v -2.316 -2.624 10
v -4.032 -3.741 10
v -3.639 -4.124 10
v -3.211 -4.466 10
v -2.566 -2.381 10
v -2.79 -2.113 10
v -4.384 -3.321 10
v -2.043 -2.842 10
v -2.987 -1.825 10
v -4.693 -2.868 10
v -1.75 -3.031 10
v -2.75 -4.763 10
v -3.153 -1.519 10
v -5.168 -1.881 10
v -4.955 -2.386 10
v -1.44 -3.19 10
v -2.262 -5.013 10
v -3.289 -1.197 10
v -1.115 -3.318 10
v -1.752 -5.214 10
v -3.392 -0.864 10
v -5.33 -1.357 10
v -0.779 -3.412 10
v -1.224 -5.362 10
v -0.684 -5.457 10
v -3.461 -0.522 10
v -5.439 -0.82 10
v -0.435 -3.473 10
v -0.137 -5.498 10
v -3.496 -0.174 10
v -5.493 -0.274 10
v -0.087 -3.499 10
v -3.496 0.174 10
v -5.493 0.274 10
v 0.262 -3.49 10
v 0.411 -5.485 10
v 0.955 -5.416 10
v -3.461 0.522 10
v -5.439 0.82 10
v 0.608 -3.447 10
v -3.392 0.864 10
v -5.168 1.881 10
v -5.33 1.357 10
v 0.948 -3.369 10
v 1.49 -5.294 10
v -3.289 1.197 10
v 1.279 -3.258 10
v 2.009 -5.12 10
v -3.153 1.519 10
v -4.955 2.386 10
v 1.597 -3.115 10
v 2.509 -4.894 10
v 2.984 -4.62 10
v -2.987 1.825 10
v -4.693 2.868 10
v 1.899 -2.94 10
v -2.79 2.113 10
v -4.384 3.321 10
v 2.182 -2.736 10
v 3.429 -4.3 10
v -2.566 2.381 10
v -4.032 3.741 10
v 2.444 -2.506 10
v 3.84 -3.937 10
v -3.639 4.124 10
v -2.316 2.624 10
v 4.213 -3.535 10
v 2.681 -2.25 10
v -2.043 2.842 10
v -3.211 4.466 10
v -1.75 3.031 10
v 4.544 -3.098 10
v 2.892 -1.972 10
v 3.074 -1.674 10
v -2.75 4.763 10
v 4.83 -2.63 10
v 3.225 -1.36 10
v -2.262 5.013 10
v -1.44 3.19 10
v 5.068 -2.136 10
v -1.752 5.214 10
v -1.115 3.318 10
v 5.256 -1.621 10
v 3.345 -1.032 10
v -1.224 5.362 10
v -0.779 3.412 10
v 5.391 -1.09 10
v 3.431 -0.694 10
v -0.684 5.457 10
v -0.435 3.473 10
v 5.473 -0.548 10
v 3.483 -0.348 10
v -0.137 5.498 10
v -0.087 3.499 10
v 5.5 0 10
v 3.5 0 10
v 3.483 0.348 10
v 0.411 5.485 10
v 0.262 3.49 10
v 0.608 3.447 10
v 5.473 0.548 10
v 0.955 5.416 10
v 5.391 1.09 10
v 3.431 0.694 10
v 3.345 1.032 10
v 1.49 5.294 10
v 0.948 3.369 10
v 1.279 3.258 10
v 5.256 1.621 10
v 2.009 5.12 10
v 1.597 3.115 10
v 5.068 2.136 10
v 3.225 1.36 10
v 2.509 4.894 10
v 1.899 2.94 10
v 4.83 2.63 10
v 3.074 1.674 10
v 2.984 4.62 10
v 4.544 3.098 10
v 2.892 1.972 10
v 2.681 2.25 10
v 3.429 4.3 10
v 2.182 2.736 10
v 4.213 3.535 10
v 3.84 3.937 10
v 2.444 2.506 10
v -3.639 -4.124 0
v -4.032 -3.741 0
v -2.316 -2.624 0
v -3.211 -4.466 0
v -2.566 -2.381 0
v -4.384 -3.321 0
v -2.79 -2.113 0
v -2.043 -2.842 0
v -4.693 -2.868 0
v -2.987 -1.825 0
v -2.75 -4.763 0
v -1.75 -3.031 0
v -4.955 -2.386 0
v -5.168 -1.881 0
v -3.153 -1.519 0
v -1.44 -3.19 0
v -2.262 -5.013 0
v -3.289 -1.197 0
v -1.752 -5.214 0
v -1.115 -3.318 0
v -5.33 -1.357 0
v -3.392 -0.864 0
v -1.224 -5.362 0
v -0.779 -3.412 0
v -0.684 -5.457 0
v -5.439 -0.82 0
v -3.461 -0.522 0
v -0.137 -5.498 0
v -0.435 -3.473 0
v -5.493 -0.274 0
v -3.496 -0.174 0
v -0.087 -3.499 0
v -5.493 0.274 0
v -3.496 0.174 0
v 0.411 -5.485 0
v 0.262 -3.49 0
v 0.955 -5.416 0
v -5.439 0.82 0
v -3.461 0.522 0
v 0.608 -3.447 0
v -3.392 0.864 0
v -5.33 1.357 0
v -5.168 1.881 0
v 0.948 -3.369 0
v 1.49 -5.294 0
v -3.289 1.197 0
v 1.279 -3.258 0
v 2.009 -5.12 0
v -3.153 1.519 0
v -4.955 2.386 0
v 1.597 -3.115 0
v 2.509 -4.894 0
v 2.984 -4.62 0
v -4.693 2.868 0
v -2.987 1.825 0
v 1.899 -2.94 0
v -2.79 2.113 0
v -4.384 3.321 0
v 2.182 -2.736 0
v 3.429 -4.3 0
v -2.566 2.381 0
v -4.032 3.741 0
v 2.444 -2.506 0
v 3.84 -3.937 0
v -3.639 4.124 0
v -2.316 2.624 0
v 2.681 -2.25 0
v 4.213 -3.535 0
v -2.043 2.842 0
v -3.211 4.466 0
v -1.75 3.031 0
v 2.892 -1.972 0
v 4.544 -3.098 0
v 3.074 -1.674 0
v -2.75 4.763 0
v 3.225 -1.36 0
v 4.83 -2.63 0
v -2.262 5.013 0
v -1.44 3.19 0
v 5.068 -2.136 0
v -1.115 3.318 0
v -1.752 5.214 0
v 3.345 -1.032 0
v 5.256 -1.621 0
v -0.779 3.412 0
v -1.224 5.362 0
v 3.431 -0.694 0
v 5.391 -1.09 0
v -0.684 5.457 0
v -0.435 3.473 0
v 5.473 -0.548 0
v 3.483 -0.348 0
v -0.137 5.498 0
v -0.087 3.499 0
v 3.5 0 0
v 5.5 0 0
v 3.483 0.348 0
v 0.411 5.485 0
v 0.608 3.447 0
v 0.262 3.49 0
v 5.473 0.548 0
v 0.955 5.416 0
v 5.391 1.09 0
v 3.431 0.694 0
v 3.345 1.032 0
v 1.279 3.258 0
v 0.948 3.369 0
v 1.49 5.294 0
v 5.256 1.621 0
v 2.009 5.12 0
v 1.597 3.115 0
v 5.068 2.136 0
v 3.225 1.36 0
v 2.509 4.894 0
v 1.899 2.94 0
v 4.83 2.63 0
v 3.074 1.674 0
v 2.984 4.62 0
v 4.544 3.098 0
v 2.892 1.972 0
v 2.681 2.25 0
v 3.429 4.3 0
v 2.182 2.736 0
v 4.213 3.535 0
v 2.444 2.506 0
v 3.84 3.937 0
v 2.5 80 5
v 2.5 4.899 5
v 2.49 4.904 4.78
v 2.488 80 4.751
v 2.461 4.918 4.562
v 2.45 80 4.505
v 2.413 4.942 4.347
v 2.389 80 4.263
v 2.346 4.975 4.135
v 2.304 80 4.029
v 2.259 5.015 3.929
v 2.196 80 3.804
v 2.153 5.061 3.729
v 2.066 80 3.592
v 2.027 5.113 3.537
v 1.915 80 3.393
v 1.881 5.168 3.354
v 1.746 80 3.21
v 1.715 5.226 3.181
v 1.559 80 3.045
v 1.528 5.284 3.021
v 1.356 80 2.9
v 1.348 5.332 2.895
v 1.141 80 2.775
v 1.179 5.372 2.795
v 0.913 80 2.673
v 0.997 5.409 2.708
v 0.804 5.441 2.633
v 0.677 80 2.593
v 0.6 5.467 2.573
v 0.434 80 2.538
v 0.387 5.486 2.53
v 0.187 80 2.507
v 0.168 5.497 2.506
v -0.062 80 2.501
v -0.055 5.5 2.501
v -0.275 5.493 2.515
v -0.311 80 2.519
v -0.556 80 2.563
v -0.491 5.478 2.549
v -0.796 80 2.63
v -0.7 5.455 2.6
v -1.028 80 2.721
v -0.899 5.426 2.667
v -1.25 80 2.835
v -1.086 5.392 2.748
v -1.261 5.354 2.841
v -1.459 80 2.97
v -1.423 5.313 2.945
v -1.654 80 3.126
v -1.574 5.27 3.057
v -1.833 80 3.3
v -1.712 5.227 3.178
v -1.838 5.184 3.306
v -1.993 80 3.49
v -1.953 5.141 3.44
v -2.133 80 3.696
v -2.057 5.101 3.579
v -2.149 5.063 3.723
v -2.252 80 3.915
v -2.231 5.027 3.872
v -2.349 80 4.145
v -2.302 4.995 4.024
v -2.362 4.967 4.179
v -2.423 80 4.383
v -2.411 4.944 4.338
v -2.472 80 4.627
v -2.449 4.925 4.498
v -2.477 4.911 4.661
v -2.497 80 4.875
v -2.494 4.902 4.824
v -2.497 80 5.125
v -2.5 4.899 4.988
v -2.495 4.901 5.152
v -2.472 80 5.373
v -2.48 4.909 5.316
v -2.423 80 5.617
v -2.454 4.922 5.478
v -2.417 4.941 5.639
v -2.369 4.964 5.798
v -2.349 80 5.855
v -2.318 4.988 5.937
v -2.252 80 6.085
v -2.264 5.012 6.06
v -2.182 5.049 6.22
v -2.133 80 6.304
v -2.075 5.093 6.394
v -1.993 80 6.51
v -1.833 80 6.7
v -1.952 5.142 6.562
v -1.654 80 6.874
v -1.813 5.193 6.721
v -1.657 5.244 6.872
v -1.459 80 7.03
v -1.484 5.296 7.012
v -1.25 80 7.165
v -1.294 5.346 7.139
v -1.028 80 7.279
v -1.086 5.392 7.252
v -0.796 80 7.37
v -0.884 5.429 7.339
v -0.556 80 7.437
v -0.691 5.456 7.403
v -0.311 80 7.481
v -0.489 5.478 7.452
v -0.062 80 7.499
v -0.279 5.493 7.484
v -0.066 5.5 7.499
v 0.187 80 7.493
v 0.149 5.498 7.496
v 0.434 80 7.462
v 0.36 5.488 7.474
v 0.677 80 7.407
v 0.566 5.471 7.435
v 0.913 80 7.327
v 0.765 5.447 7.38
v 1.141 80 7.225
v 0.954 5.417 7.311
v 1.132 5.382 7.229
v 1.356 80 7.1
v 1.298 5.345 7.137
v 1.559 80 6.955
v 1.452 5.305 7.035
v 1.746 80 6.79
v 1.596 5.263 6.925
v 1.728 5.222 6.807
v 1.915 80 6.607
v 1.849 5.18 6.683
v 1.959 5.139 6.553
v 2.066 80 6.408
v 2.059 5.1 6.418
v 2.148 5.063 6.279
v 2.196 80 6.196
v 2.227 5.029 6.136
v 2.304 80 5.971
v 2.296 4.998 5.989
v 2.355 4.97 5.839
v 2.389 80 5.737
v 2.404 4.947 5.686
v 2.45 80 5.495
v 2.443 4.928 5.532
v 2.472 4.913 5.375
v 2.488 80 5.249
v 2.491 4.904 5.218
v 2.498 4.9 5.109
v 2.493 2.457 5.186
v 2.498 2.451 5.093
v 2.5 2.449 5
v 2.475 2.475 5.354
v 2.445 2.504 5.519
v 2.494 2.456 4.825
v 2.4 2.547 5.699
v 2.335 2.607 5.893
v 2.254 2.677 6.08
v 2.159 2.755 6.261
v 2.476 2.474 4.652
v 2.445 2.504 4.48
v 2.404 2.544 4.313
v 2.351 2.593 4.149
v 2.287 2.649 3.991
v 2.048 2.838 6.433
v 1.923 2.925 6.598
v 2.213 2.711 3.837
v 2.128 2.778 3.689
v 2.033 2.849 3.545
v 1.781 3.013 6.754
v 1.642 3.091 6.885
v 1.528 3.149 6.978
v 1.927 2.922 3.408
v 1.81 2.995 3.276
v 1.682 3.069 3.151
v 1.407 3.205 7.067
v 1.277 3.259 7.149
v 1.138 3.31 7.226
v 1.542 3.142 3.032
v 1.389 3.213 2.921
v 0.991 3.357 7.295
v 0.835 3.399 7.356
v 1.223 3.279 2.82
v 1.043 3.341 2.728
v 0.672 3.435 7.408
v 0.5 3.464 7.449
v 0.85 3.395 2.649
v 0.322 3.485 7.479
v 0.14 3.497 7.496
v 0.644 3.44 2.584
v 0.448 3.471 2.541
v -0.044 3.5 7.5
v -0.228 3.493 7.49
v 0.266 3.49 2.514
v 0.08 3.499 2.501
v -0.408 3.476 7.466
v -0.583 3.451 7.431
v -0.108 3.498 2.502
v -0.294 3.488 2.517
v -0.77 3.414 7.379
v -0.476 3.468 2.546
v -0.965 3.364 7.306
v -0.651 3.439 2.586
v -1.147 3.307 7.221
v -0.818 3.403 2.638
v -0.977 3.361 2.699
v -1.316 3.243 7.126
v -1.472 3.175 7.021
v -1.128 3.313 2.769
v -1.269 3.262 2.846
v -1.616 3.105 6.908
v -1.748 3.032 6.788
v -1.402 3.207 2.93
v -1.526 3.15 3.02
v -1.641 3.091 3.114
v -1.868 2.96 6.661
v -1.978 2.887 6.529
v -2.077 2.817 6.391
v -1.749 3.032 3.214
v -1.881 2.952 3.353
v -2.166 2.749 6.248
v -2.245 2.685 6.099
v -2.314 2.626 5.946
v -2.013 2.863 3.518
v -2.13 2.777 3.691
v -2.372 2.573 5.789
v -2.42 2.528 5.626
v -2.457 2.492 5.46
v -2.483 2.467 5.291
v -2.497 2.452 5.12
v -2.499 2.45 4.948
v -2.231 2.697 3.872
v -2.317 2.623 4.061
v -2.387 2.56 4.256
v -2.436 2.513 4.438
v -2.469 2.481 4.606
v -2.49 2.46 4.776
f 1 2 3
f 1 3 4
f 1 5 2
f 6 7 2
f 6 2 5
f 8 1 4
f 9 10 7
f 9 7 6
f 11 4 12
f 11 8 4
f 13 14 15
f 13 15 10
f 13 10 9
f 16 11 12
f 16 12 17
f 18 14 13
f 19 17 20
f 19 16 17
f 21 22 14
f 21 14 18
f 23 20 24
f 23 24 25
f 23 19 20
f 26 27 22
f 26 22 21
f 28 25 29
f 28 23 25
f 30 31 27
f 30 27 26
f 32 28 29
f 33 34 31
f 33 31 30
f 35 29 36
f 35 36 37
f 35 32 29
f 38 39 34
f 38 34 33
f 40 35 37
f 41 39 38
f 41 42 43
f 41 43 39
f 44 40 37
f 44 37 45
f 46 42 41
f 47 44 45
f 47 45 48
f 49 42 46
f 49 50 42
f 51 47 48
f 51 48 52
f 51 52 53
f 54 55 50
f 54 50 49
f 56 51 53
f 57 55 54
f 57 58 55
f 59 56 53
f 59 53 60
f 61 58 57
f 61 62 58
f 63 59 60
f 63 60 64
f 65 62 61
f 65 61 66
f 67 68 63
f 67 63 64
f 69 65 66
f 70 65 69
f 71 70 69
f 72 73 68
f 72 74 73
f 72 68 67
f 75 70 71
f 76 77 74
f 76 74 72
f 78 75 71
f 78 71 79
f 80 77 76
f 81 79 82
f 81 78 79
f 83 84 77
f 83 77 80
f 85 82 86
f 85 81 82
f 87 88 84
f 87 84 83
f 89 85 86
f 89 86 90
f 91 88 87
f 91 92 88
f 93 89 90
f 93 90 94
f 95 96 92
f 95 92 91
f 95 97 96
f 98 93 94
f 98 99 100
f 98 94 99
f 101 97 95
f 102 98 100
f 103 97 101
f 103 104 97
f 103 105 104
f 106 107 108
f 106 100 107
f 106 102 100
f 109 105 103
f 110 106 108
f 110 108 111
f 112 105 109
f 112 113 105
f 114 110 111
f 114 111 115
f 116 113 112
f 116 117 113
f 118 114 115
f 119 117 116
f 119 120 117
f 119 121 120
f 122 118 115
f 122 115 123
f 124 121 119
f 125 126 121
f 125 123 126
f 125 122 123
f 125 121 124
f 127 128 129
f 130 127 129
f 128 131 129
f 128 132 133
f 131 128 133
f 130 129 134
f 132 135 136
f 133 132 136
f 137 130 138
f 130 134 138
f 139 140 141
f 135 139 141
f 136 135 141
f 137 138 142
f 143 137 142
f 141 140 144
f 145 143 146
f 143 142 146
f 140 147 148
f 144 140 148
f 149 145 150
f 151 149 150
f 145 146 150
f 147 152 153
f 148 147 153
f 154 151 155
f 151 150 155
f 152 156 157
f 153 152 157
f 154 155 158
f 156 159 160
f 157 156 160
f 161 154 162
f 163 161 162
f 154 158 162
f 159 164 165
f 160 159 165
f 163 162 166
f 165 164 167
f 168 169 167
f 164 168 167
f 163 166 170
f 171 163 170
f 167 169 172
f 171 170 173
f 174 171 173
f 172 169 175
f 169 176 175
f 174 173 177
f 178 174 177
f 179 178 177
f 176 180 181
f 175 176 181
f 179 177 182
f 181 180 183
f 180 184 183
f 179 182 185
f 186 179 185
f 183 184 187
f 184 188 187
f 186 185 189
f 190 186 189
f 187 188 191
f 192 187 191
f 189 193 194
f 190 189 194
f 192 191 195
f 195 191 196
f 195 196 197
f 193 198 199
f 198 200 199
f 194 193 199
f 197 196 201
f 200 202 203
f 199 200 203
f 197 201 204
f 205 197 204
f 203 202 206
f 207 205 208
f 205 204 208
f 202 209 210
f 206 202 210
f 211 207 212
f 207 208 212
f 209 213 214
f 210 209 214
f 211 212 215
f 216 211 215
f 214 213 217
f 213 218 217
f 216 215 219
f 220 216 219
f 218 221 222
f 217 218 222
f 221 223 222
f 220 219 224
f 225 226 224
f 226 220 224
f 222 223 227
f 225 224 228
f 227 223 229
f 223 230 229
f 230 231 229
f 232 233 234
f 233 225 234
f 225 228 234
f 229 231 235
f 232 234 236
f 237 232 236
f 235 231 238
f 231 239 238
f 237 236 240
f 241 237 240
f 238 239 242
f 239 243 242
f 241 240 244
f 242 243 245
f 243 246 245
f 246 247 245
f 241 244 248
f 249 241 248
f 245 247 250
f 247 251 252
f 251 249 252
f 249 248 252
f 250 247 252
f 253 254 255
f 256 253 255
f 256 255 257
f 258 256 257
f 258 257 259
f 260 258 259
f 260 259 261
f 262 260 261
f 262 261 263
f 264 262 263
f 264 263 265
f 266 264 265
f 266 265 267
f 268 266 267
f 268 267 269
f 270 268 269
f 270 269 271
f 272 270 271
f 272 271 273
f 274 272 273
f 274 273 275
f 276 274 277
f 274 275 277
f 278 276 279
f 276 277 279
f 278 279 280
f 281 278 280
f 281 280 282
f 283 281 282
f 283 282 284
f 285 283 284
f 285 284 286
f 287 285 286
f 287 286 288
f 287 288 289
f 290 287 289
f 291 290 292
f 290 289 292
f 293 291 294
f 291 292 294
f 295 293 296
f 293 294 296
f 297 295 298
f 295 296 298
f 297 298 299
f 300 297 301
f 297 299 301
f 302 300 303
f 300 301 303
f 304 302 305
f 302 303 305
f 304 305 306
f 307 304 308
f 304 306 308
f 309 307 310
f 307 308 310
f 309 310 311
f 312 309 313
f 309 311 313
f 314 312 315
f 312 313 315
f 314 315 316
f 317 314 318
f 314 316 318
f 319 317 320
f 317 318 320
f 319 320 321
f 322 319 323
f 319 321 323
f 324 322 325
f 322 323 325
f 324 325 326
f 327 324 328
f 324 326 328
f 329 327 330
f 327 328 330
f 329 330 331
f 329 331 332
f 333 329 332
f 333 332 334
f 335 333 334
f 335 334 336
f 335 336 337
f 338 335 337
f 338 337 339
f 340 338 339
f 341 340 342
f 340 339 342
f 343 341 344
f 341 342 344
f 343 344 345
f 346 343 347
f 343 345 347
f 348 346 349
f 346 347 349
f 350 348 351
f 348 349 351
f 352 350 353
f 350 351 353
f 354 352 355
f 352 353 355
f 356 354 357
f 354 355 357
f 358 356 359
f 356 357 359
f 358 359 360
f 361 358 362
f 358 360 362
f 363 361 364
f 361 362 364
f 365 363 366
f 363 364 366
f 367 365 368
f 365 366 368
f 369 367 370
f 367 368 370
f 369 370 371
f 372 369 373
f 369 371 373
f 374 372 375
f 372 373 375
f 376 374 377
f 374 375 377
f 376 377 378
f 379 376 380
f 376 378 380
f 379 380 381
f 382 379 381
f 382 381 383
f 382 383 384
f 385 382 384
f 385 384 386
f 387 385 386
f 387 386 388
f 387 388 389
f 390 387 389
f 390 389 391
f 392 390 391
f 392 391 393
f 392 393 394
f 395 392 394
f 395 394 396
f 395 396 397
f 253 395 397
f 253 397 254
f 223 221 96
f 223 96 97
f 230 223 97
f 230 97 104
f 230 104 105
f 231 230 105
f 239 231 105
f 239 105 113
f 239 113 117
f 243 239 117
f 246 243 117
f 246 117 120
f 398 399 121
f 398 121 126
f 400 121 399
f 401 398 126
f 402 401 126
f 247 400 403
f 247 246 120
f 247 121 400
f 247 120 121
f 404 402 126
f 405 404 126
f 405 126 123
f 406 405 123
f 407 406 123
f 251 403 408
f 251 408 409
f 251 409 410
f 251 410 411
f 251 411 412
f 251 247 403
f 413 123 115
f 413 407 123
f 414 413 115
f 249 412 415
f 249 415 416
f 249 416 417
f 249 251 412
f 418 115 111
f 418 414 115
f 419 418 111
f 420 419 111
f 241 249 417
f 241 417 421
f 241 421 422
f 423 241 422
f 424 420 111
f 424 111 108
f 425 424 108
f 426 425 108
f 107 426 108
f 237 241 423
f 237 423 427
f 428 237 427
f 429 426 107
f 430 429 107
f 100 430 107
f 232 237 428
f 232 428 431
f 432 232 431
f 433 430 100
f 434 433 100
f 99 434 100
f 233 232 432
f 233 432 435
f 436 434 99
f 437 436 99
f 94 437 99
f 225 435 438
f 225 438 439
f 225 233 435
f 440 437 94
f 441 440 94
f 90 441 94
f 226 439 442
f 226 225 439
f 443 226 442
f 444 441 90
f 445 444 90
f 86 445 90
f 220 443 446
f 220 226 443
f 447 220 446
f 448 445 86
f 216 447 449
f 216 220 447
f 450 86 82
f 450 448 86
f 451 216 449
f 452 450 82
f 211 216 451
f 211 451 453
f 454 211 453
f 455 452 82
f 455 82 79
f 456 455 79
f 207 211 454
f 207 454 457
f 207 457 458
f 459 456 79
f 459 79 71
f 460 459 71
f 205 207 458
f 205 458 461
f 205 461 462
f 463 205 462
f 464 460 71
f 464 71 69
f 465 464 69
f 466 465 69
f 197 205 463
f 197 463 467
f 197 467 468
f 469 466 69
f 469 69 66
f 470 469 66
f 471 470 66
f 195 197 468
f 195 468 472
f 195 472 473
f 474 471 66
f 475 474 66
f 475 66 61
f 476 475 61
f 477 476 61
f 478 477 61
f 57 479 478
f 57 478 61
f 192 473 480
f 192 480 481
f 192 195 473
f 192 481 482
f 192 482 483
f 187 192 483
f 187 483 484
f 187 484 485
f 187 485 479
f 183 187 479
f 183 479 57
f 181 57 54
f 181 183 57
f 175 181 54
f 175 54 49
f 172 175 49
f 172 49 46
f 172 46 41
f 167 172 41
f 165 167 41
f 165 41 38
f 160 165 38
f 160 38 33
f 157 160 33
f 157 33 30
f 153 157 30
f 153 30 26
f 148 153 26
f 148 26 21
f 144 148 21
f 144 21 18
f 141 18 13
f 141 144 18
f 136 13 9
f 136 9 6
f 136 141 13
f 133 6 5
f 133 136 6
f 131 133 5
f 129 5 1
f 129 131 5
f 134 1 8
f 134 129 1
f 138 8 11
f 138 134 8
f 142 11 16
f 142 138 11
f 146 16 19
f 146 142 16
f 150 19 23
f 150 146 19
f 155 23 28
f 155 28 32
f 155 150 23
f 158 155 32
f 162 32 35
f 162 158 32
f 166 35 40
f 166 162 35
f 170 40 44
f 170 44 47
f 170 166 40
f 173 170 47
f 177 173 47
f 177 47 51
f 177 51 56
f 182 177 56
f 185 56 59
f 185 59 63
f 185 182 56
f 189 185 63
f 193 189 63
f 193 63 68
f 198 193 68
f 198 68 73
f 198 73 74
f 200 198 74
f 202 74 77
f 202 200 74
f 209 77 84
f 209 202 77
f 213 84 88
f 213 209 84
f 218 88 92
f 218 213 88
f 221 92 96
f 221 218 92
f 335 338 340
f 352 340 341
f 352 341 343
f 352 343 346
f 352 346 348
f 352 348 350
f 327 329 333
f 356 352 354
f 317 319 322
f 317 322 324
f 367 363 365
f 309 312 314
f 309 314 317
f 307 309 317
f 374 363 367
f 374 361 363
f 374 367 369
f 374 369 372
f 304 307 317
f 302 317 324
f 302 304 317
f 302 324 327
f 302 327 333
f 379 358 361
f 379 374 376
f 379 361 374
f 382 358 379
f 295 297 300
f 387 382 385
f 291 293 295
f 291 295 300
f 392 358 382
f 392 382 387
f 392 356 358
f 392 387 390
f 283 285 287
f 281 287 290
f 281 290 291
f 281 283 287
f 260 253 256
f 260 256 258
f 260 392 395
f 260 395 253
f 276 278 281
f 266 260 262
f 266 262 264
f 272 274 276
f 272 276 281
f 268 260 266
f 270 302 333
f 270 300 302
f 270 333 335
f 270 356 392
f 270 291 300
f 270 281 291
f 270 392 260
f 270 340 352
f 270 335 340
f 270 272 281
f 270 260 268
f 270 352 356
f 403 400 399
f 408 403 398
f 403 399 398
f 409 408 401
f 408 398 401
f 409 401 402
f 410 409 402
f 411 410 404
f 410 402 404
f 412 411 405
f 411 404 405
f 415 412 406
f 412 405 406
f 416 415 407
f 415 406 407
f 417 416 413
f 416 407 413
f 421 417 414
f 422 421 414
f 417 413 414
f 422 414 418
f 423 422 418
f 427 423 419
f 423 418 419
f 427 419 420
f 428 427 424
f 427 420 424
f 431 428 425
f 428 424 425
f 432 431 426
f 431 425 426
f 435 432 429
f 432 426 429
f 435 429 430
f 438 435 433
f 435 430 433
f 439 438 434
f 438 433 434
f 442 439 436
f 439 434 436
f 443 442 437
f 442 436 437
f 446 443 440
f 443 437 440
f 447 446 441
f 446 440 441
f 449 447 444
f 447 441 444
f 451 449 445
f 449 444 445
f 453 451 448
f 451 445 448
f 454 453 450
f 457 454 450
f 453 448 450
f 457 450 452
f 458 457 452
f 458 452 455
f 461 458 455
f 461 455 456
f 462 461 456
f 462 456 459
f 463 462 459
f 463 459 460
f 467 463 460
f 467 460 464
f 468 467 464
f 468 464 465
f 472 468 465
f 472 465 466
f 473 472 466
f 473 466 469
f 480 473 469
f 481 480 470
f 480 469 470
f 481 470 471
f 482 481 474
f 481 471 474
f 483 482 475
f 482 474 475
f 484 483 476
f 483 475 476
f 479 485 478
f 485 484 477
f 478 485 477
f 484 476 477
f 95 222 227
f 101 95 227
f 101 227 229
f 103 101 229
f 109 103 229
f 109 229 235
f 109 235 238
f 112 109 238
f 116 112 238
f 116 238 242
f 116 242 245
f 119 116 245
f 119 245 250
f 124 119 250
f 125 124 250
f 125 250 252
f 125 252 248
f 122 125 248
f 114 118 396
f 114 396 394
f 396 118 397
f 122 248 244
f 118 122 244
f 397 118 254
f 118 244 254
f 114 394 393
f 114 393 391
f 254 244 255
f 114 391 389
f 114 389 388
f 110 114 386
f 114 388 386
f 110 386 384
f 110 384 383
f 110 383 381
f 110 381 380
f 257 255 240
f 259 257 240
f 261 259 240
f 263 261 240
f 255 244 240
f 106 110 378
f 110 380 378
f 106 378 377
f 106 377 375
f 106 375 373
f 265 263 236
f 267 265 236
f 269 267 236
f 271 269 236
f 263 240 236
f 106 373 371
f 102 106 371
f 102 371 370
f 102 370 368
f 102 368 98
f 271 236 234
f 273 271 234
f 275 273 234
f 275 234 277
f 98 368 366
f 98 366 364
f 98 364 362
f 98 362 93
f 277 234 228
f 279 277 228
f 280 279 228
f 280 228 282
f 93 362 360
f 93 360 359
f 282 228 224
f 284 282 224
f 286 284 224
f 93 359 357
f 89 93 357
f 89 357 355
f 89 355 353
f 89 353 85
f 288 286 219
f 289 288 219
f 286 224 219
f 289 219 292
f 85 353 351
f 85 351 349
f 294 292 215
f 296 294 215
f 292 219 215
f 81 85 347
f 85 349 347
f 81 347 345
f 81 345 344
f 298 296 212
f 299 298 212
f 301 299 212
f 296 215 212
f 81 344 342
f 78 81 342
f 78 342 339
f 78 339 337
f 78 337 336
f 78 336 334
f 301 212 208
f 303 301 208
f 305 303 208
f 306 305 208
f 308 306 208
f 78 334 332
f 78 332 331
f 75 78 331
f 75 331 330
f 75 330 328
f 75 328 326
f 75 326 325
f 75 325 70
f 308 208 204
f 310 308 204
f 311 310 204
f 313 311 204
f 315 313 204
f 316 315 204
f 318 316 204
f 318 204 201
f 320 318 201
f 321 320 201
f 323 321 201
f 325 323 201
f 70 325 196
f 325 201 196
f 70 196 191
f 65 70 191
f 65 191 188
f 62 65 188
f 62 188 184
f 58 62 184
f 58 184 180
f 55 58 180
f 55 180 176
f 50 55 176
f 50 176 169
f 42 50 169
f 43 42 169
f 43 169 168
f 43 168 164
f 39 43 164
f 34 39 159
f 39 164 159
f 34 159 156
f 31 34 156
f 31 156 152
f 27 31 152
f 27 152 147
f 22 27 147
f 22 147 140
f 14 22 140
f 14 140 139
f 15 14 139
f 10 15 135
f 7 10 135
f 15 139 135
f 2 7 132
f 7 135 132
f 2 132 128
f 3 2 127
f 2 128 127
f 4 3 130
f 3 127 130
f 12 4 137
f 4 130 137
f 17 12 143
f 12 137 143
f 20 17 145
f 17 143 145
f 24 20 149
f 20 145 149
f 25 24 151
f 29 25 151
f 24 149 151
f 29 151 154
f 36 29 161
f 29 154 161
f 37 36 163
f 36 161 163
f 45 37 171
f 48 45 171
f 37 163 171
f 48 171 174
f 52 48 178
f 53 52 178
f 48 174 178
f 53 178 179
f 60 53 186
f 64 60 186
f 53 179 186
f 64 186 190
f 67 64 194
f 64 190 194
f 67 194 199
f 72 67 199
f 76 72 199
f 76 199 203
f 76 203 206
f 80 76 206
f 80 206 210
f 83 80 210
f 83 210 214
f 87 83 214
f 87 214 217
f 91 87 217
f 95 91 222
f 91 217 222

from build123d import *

# Parameters (mm, degrees)
SKETCH1_R           = 5.5
SKETCH1_R_2         = 3.5
BOSS_EXTRUDE1_DEPTH = 10
SKETCH2_R           = 2.5
BOSS_EXTRUDE2_DEPTH = 80
SKETCH3_R           = 3.5
CUT_EXTRUDE1_DEPTH  = 11.0000001


with BuildPart() as part:
    # Sketch1 → Boss-Extrude1 (new body)
    with BuildSketch(Plane.XY):
        Circle(SKETCH1_R)
        Circle(SKETCH1_R_2, mode=Mode.SUBTRACT)
    extrude(amount=BOSS_EXTRUDE1_DEPTH)

    # Sketch2 → Boss-Extrude2 (add)
    with BuildSketch(Plane(origin=(0, 0, 0), x_dir=(1, 0, 0), z_dir=(0, 1, 0))):
        with Locations((0, -5)):
            Circle(SKETCH2_R)
    extrude(amount=BOSS_EXTRUDE2_DEPTH)

    # Sketch3 → Cut-Extrude1 (cut, through all)
    with BuildSketch(Plane.XY.offset(10)):
        Circle(SKETCH3_R)
    extrude(amount=-CUT_EXTRUDE1_DEPTH, mode=Mode.SUBTRACT)


solid = part.part
